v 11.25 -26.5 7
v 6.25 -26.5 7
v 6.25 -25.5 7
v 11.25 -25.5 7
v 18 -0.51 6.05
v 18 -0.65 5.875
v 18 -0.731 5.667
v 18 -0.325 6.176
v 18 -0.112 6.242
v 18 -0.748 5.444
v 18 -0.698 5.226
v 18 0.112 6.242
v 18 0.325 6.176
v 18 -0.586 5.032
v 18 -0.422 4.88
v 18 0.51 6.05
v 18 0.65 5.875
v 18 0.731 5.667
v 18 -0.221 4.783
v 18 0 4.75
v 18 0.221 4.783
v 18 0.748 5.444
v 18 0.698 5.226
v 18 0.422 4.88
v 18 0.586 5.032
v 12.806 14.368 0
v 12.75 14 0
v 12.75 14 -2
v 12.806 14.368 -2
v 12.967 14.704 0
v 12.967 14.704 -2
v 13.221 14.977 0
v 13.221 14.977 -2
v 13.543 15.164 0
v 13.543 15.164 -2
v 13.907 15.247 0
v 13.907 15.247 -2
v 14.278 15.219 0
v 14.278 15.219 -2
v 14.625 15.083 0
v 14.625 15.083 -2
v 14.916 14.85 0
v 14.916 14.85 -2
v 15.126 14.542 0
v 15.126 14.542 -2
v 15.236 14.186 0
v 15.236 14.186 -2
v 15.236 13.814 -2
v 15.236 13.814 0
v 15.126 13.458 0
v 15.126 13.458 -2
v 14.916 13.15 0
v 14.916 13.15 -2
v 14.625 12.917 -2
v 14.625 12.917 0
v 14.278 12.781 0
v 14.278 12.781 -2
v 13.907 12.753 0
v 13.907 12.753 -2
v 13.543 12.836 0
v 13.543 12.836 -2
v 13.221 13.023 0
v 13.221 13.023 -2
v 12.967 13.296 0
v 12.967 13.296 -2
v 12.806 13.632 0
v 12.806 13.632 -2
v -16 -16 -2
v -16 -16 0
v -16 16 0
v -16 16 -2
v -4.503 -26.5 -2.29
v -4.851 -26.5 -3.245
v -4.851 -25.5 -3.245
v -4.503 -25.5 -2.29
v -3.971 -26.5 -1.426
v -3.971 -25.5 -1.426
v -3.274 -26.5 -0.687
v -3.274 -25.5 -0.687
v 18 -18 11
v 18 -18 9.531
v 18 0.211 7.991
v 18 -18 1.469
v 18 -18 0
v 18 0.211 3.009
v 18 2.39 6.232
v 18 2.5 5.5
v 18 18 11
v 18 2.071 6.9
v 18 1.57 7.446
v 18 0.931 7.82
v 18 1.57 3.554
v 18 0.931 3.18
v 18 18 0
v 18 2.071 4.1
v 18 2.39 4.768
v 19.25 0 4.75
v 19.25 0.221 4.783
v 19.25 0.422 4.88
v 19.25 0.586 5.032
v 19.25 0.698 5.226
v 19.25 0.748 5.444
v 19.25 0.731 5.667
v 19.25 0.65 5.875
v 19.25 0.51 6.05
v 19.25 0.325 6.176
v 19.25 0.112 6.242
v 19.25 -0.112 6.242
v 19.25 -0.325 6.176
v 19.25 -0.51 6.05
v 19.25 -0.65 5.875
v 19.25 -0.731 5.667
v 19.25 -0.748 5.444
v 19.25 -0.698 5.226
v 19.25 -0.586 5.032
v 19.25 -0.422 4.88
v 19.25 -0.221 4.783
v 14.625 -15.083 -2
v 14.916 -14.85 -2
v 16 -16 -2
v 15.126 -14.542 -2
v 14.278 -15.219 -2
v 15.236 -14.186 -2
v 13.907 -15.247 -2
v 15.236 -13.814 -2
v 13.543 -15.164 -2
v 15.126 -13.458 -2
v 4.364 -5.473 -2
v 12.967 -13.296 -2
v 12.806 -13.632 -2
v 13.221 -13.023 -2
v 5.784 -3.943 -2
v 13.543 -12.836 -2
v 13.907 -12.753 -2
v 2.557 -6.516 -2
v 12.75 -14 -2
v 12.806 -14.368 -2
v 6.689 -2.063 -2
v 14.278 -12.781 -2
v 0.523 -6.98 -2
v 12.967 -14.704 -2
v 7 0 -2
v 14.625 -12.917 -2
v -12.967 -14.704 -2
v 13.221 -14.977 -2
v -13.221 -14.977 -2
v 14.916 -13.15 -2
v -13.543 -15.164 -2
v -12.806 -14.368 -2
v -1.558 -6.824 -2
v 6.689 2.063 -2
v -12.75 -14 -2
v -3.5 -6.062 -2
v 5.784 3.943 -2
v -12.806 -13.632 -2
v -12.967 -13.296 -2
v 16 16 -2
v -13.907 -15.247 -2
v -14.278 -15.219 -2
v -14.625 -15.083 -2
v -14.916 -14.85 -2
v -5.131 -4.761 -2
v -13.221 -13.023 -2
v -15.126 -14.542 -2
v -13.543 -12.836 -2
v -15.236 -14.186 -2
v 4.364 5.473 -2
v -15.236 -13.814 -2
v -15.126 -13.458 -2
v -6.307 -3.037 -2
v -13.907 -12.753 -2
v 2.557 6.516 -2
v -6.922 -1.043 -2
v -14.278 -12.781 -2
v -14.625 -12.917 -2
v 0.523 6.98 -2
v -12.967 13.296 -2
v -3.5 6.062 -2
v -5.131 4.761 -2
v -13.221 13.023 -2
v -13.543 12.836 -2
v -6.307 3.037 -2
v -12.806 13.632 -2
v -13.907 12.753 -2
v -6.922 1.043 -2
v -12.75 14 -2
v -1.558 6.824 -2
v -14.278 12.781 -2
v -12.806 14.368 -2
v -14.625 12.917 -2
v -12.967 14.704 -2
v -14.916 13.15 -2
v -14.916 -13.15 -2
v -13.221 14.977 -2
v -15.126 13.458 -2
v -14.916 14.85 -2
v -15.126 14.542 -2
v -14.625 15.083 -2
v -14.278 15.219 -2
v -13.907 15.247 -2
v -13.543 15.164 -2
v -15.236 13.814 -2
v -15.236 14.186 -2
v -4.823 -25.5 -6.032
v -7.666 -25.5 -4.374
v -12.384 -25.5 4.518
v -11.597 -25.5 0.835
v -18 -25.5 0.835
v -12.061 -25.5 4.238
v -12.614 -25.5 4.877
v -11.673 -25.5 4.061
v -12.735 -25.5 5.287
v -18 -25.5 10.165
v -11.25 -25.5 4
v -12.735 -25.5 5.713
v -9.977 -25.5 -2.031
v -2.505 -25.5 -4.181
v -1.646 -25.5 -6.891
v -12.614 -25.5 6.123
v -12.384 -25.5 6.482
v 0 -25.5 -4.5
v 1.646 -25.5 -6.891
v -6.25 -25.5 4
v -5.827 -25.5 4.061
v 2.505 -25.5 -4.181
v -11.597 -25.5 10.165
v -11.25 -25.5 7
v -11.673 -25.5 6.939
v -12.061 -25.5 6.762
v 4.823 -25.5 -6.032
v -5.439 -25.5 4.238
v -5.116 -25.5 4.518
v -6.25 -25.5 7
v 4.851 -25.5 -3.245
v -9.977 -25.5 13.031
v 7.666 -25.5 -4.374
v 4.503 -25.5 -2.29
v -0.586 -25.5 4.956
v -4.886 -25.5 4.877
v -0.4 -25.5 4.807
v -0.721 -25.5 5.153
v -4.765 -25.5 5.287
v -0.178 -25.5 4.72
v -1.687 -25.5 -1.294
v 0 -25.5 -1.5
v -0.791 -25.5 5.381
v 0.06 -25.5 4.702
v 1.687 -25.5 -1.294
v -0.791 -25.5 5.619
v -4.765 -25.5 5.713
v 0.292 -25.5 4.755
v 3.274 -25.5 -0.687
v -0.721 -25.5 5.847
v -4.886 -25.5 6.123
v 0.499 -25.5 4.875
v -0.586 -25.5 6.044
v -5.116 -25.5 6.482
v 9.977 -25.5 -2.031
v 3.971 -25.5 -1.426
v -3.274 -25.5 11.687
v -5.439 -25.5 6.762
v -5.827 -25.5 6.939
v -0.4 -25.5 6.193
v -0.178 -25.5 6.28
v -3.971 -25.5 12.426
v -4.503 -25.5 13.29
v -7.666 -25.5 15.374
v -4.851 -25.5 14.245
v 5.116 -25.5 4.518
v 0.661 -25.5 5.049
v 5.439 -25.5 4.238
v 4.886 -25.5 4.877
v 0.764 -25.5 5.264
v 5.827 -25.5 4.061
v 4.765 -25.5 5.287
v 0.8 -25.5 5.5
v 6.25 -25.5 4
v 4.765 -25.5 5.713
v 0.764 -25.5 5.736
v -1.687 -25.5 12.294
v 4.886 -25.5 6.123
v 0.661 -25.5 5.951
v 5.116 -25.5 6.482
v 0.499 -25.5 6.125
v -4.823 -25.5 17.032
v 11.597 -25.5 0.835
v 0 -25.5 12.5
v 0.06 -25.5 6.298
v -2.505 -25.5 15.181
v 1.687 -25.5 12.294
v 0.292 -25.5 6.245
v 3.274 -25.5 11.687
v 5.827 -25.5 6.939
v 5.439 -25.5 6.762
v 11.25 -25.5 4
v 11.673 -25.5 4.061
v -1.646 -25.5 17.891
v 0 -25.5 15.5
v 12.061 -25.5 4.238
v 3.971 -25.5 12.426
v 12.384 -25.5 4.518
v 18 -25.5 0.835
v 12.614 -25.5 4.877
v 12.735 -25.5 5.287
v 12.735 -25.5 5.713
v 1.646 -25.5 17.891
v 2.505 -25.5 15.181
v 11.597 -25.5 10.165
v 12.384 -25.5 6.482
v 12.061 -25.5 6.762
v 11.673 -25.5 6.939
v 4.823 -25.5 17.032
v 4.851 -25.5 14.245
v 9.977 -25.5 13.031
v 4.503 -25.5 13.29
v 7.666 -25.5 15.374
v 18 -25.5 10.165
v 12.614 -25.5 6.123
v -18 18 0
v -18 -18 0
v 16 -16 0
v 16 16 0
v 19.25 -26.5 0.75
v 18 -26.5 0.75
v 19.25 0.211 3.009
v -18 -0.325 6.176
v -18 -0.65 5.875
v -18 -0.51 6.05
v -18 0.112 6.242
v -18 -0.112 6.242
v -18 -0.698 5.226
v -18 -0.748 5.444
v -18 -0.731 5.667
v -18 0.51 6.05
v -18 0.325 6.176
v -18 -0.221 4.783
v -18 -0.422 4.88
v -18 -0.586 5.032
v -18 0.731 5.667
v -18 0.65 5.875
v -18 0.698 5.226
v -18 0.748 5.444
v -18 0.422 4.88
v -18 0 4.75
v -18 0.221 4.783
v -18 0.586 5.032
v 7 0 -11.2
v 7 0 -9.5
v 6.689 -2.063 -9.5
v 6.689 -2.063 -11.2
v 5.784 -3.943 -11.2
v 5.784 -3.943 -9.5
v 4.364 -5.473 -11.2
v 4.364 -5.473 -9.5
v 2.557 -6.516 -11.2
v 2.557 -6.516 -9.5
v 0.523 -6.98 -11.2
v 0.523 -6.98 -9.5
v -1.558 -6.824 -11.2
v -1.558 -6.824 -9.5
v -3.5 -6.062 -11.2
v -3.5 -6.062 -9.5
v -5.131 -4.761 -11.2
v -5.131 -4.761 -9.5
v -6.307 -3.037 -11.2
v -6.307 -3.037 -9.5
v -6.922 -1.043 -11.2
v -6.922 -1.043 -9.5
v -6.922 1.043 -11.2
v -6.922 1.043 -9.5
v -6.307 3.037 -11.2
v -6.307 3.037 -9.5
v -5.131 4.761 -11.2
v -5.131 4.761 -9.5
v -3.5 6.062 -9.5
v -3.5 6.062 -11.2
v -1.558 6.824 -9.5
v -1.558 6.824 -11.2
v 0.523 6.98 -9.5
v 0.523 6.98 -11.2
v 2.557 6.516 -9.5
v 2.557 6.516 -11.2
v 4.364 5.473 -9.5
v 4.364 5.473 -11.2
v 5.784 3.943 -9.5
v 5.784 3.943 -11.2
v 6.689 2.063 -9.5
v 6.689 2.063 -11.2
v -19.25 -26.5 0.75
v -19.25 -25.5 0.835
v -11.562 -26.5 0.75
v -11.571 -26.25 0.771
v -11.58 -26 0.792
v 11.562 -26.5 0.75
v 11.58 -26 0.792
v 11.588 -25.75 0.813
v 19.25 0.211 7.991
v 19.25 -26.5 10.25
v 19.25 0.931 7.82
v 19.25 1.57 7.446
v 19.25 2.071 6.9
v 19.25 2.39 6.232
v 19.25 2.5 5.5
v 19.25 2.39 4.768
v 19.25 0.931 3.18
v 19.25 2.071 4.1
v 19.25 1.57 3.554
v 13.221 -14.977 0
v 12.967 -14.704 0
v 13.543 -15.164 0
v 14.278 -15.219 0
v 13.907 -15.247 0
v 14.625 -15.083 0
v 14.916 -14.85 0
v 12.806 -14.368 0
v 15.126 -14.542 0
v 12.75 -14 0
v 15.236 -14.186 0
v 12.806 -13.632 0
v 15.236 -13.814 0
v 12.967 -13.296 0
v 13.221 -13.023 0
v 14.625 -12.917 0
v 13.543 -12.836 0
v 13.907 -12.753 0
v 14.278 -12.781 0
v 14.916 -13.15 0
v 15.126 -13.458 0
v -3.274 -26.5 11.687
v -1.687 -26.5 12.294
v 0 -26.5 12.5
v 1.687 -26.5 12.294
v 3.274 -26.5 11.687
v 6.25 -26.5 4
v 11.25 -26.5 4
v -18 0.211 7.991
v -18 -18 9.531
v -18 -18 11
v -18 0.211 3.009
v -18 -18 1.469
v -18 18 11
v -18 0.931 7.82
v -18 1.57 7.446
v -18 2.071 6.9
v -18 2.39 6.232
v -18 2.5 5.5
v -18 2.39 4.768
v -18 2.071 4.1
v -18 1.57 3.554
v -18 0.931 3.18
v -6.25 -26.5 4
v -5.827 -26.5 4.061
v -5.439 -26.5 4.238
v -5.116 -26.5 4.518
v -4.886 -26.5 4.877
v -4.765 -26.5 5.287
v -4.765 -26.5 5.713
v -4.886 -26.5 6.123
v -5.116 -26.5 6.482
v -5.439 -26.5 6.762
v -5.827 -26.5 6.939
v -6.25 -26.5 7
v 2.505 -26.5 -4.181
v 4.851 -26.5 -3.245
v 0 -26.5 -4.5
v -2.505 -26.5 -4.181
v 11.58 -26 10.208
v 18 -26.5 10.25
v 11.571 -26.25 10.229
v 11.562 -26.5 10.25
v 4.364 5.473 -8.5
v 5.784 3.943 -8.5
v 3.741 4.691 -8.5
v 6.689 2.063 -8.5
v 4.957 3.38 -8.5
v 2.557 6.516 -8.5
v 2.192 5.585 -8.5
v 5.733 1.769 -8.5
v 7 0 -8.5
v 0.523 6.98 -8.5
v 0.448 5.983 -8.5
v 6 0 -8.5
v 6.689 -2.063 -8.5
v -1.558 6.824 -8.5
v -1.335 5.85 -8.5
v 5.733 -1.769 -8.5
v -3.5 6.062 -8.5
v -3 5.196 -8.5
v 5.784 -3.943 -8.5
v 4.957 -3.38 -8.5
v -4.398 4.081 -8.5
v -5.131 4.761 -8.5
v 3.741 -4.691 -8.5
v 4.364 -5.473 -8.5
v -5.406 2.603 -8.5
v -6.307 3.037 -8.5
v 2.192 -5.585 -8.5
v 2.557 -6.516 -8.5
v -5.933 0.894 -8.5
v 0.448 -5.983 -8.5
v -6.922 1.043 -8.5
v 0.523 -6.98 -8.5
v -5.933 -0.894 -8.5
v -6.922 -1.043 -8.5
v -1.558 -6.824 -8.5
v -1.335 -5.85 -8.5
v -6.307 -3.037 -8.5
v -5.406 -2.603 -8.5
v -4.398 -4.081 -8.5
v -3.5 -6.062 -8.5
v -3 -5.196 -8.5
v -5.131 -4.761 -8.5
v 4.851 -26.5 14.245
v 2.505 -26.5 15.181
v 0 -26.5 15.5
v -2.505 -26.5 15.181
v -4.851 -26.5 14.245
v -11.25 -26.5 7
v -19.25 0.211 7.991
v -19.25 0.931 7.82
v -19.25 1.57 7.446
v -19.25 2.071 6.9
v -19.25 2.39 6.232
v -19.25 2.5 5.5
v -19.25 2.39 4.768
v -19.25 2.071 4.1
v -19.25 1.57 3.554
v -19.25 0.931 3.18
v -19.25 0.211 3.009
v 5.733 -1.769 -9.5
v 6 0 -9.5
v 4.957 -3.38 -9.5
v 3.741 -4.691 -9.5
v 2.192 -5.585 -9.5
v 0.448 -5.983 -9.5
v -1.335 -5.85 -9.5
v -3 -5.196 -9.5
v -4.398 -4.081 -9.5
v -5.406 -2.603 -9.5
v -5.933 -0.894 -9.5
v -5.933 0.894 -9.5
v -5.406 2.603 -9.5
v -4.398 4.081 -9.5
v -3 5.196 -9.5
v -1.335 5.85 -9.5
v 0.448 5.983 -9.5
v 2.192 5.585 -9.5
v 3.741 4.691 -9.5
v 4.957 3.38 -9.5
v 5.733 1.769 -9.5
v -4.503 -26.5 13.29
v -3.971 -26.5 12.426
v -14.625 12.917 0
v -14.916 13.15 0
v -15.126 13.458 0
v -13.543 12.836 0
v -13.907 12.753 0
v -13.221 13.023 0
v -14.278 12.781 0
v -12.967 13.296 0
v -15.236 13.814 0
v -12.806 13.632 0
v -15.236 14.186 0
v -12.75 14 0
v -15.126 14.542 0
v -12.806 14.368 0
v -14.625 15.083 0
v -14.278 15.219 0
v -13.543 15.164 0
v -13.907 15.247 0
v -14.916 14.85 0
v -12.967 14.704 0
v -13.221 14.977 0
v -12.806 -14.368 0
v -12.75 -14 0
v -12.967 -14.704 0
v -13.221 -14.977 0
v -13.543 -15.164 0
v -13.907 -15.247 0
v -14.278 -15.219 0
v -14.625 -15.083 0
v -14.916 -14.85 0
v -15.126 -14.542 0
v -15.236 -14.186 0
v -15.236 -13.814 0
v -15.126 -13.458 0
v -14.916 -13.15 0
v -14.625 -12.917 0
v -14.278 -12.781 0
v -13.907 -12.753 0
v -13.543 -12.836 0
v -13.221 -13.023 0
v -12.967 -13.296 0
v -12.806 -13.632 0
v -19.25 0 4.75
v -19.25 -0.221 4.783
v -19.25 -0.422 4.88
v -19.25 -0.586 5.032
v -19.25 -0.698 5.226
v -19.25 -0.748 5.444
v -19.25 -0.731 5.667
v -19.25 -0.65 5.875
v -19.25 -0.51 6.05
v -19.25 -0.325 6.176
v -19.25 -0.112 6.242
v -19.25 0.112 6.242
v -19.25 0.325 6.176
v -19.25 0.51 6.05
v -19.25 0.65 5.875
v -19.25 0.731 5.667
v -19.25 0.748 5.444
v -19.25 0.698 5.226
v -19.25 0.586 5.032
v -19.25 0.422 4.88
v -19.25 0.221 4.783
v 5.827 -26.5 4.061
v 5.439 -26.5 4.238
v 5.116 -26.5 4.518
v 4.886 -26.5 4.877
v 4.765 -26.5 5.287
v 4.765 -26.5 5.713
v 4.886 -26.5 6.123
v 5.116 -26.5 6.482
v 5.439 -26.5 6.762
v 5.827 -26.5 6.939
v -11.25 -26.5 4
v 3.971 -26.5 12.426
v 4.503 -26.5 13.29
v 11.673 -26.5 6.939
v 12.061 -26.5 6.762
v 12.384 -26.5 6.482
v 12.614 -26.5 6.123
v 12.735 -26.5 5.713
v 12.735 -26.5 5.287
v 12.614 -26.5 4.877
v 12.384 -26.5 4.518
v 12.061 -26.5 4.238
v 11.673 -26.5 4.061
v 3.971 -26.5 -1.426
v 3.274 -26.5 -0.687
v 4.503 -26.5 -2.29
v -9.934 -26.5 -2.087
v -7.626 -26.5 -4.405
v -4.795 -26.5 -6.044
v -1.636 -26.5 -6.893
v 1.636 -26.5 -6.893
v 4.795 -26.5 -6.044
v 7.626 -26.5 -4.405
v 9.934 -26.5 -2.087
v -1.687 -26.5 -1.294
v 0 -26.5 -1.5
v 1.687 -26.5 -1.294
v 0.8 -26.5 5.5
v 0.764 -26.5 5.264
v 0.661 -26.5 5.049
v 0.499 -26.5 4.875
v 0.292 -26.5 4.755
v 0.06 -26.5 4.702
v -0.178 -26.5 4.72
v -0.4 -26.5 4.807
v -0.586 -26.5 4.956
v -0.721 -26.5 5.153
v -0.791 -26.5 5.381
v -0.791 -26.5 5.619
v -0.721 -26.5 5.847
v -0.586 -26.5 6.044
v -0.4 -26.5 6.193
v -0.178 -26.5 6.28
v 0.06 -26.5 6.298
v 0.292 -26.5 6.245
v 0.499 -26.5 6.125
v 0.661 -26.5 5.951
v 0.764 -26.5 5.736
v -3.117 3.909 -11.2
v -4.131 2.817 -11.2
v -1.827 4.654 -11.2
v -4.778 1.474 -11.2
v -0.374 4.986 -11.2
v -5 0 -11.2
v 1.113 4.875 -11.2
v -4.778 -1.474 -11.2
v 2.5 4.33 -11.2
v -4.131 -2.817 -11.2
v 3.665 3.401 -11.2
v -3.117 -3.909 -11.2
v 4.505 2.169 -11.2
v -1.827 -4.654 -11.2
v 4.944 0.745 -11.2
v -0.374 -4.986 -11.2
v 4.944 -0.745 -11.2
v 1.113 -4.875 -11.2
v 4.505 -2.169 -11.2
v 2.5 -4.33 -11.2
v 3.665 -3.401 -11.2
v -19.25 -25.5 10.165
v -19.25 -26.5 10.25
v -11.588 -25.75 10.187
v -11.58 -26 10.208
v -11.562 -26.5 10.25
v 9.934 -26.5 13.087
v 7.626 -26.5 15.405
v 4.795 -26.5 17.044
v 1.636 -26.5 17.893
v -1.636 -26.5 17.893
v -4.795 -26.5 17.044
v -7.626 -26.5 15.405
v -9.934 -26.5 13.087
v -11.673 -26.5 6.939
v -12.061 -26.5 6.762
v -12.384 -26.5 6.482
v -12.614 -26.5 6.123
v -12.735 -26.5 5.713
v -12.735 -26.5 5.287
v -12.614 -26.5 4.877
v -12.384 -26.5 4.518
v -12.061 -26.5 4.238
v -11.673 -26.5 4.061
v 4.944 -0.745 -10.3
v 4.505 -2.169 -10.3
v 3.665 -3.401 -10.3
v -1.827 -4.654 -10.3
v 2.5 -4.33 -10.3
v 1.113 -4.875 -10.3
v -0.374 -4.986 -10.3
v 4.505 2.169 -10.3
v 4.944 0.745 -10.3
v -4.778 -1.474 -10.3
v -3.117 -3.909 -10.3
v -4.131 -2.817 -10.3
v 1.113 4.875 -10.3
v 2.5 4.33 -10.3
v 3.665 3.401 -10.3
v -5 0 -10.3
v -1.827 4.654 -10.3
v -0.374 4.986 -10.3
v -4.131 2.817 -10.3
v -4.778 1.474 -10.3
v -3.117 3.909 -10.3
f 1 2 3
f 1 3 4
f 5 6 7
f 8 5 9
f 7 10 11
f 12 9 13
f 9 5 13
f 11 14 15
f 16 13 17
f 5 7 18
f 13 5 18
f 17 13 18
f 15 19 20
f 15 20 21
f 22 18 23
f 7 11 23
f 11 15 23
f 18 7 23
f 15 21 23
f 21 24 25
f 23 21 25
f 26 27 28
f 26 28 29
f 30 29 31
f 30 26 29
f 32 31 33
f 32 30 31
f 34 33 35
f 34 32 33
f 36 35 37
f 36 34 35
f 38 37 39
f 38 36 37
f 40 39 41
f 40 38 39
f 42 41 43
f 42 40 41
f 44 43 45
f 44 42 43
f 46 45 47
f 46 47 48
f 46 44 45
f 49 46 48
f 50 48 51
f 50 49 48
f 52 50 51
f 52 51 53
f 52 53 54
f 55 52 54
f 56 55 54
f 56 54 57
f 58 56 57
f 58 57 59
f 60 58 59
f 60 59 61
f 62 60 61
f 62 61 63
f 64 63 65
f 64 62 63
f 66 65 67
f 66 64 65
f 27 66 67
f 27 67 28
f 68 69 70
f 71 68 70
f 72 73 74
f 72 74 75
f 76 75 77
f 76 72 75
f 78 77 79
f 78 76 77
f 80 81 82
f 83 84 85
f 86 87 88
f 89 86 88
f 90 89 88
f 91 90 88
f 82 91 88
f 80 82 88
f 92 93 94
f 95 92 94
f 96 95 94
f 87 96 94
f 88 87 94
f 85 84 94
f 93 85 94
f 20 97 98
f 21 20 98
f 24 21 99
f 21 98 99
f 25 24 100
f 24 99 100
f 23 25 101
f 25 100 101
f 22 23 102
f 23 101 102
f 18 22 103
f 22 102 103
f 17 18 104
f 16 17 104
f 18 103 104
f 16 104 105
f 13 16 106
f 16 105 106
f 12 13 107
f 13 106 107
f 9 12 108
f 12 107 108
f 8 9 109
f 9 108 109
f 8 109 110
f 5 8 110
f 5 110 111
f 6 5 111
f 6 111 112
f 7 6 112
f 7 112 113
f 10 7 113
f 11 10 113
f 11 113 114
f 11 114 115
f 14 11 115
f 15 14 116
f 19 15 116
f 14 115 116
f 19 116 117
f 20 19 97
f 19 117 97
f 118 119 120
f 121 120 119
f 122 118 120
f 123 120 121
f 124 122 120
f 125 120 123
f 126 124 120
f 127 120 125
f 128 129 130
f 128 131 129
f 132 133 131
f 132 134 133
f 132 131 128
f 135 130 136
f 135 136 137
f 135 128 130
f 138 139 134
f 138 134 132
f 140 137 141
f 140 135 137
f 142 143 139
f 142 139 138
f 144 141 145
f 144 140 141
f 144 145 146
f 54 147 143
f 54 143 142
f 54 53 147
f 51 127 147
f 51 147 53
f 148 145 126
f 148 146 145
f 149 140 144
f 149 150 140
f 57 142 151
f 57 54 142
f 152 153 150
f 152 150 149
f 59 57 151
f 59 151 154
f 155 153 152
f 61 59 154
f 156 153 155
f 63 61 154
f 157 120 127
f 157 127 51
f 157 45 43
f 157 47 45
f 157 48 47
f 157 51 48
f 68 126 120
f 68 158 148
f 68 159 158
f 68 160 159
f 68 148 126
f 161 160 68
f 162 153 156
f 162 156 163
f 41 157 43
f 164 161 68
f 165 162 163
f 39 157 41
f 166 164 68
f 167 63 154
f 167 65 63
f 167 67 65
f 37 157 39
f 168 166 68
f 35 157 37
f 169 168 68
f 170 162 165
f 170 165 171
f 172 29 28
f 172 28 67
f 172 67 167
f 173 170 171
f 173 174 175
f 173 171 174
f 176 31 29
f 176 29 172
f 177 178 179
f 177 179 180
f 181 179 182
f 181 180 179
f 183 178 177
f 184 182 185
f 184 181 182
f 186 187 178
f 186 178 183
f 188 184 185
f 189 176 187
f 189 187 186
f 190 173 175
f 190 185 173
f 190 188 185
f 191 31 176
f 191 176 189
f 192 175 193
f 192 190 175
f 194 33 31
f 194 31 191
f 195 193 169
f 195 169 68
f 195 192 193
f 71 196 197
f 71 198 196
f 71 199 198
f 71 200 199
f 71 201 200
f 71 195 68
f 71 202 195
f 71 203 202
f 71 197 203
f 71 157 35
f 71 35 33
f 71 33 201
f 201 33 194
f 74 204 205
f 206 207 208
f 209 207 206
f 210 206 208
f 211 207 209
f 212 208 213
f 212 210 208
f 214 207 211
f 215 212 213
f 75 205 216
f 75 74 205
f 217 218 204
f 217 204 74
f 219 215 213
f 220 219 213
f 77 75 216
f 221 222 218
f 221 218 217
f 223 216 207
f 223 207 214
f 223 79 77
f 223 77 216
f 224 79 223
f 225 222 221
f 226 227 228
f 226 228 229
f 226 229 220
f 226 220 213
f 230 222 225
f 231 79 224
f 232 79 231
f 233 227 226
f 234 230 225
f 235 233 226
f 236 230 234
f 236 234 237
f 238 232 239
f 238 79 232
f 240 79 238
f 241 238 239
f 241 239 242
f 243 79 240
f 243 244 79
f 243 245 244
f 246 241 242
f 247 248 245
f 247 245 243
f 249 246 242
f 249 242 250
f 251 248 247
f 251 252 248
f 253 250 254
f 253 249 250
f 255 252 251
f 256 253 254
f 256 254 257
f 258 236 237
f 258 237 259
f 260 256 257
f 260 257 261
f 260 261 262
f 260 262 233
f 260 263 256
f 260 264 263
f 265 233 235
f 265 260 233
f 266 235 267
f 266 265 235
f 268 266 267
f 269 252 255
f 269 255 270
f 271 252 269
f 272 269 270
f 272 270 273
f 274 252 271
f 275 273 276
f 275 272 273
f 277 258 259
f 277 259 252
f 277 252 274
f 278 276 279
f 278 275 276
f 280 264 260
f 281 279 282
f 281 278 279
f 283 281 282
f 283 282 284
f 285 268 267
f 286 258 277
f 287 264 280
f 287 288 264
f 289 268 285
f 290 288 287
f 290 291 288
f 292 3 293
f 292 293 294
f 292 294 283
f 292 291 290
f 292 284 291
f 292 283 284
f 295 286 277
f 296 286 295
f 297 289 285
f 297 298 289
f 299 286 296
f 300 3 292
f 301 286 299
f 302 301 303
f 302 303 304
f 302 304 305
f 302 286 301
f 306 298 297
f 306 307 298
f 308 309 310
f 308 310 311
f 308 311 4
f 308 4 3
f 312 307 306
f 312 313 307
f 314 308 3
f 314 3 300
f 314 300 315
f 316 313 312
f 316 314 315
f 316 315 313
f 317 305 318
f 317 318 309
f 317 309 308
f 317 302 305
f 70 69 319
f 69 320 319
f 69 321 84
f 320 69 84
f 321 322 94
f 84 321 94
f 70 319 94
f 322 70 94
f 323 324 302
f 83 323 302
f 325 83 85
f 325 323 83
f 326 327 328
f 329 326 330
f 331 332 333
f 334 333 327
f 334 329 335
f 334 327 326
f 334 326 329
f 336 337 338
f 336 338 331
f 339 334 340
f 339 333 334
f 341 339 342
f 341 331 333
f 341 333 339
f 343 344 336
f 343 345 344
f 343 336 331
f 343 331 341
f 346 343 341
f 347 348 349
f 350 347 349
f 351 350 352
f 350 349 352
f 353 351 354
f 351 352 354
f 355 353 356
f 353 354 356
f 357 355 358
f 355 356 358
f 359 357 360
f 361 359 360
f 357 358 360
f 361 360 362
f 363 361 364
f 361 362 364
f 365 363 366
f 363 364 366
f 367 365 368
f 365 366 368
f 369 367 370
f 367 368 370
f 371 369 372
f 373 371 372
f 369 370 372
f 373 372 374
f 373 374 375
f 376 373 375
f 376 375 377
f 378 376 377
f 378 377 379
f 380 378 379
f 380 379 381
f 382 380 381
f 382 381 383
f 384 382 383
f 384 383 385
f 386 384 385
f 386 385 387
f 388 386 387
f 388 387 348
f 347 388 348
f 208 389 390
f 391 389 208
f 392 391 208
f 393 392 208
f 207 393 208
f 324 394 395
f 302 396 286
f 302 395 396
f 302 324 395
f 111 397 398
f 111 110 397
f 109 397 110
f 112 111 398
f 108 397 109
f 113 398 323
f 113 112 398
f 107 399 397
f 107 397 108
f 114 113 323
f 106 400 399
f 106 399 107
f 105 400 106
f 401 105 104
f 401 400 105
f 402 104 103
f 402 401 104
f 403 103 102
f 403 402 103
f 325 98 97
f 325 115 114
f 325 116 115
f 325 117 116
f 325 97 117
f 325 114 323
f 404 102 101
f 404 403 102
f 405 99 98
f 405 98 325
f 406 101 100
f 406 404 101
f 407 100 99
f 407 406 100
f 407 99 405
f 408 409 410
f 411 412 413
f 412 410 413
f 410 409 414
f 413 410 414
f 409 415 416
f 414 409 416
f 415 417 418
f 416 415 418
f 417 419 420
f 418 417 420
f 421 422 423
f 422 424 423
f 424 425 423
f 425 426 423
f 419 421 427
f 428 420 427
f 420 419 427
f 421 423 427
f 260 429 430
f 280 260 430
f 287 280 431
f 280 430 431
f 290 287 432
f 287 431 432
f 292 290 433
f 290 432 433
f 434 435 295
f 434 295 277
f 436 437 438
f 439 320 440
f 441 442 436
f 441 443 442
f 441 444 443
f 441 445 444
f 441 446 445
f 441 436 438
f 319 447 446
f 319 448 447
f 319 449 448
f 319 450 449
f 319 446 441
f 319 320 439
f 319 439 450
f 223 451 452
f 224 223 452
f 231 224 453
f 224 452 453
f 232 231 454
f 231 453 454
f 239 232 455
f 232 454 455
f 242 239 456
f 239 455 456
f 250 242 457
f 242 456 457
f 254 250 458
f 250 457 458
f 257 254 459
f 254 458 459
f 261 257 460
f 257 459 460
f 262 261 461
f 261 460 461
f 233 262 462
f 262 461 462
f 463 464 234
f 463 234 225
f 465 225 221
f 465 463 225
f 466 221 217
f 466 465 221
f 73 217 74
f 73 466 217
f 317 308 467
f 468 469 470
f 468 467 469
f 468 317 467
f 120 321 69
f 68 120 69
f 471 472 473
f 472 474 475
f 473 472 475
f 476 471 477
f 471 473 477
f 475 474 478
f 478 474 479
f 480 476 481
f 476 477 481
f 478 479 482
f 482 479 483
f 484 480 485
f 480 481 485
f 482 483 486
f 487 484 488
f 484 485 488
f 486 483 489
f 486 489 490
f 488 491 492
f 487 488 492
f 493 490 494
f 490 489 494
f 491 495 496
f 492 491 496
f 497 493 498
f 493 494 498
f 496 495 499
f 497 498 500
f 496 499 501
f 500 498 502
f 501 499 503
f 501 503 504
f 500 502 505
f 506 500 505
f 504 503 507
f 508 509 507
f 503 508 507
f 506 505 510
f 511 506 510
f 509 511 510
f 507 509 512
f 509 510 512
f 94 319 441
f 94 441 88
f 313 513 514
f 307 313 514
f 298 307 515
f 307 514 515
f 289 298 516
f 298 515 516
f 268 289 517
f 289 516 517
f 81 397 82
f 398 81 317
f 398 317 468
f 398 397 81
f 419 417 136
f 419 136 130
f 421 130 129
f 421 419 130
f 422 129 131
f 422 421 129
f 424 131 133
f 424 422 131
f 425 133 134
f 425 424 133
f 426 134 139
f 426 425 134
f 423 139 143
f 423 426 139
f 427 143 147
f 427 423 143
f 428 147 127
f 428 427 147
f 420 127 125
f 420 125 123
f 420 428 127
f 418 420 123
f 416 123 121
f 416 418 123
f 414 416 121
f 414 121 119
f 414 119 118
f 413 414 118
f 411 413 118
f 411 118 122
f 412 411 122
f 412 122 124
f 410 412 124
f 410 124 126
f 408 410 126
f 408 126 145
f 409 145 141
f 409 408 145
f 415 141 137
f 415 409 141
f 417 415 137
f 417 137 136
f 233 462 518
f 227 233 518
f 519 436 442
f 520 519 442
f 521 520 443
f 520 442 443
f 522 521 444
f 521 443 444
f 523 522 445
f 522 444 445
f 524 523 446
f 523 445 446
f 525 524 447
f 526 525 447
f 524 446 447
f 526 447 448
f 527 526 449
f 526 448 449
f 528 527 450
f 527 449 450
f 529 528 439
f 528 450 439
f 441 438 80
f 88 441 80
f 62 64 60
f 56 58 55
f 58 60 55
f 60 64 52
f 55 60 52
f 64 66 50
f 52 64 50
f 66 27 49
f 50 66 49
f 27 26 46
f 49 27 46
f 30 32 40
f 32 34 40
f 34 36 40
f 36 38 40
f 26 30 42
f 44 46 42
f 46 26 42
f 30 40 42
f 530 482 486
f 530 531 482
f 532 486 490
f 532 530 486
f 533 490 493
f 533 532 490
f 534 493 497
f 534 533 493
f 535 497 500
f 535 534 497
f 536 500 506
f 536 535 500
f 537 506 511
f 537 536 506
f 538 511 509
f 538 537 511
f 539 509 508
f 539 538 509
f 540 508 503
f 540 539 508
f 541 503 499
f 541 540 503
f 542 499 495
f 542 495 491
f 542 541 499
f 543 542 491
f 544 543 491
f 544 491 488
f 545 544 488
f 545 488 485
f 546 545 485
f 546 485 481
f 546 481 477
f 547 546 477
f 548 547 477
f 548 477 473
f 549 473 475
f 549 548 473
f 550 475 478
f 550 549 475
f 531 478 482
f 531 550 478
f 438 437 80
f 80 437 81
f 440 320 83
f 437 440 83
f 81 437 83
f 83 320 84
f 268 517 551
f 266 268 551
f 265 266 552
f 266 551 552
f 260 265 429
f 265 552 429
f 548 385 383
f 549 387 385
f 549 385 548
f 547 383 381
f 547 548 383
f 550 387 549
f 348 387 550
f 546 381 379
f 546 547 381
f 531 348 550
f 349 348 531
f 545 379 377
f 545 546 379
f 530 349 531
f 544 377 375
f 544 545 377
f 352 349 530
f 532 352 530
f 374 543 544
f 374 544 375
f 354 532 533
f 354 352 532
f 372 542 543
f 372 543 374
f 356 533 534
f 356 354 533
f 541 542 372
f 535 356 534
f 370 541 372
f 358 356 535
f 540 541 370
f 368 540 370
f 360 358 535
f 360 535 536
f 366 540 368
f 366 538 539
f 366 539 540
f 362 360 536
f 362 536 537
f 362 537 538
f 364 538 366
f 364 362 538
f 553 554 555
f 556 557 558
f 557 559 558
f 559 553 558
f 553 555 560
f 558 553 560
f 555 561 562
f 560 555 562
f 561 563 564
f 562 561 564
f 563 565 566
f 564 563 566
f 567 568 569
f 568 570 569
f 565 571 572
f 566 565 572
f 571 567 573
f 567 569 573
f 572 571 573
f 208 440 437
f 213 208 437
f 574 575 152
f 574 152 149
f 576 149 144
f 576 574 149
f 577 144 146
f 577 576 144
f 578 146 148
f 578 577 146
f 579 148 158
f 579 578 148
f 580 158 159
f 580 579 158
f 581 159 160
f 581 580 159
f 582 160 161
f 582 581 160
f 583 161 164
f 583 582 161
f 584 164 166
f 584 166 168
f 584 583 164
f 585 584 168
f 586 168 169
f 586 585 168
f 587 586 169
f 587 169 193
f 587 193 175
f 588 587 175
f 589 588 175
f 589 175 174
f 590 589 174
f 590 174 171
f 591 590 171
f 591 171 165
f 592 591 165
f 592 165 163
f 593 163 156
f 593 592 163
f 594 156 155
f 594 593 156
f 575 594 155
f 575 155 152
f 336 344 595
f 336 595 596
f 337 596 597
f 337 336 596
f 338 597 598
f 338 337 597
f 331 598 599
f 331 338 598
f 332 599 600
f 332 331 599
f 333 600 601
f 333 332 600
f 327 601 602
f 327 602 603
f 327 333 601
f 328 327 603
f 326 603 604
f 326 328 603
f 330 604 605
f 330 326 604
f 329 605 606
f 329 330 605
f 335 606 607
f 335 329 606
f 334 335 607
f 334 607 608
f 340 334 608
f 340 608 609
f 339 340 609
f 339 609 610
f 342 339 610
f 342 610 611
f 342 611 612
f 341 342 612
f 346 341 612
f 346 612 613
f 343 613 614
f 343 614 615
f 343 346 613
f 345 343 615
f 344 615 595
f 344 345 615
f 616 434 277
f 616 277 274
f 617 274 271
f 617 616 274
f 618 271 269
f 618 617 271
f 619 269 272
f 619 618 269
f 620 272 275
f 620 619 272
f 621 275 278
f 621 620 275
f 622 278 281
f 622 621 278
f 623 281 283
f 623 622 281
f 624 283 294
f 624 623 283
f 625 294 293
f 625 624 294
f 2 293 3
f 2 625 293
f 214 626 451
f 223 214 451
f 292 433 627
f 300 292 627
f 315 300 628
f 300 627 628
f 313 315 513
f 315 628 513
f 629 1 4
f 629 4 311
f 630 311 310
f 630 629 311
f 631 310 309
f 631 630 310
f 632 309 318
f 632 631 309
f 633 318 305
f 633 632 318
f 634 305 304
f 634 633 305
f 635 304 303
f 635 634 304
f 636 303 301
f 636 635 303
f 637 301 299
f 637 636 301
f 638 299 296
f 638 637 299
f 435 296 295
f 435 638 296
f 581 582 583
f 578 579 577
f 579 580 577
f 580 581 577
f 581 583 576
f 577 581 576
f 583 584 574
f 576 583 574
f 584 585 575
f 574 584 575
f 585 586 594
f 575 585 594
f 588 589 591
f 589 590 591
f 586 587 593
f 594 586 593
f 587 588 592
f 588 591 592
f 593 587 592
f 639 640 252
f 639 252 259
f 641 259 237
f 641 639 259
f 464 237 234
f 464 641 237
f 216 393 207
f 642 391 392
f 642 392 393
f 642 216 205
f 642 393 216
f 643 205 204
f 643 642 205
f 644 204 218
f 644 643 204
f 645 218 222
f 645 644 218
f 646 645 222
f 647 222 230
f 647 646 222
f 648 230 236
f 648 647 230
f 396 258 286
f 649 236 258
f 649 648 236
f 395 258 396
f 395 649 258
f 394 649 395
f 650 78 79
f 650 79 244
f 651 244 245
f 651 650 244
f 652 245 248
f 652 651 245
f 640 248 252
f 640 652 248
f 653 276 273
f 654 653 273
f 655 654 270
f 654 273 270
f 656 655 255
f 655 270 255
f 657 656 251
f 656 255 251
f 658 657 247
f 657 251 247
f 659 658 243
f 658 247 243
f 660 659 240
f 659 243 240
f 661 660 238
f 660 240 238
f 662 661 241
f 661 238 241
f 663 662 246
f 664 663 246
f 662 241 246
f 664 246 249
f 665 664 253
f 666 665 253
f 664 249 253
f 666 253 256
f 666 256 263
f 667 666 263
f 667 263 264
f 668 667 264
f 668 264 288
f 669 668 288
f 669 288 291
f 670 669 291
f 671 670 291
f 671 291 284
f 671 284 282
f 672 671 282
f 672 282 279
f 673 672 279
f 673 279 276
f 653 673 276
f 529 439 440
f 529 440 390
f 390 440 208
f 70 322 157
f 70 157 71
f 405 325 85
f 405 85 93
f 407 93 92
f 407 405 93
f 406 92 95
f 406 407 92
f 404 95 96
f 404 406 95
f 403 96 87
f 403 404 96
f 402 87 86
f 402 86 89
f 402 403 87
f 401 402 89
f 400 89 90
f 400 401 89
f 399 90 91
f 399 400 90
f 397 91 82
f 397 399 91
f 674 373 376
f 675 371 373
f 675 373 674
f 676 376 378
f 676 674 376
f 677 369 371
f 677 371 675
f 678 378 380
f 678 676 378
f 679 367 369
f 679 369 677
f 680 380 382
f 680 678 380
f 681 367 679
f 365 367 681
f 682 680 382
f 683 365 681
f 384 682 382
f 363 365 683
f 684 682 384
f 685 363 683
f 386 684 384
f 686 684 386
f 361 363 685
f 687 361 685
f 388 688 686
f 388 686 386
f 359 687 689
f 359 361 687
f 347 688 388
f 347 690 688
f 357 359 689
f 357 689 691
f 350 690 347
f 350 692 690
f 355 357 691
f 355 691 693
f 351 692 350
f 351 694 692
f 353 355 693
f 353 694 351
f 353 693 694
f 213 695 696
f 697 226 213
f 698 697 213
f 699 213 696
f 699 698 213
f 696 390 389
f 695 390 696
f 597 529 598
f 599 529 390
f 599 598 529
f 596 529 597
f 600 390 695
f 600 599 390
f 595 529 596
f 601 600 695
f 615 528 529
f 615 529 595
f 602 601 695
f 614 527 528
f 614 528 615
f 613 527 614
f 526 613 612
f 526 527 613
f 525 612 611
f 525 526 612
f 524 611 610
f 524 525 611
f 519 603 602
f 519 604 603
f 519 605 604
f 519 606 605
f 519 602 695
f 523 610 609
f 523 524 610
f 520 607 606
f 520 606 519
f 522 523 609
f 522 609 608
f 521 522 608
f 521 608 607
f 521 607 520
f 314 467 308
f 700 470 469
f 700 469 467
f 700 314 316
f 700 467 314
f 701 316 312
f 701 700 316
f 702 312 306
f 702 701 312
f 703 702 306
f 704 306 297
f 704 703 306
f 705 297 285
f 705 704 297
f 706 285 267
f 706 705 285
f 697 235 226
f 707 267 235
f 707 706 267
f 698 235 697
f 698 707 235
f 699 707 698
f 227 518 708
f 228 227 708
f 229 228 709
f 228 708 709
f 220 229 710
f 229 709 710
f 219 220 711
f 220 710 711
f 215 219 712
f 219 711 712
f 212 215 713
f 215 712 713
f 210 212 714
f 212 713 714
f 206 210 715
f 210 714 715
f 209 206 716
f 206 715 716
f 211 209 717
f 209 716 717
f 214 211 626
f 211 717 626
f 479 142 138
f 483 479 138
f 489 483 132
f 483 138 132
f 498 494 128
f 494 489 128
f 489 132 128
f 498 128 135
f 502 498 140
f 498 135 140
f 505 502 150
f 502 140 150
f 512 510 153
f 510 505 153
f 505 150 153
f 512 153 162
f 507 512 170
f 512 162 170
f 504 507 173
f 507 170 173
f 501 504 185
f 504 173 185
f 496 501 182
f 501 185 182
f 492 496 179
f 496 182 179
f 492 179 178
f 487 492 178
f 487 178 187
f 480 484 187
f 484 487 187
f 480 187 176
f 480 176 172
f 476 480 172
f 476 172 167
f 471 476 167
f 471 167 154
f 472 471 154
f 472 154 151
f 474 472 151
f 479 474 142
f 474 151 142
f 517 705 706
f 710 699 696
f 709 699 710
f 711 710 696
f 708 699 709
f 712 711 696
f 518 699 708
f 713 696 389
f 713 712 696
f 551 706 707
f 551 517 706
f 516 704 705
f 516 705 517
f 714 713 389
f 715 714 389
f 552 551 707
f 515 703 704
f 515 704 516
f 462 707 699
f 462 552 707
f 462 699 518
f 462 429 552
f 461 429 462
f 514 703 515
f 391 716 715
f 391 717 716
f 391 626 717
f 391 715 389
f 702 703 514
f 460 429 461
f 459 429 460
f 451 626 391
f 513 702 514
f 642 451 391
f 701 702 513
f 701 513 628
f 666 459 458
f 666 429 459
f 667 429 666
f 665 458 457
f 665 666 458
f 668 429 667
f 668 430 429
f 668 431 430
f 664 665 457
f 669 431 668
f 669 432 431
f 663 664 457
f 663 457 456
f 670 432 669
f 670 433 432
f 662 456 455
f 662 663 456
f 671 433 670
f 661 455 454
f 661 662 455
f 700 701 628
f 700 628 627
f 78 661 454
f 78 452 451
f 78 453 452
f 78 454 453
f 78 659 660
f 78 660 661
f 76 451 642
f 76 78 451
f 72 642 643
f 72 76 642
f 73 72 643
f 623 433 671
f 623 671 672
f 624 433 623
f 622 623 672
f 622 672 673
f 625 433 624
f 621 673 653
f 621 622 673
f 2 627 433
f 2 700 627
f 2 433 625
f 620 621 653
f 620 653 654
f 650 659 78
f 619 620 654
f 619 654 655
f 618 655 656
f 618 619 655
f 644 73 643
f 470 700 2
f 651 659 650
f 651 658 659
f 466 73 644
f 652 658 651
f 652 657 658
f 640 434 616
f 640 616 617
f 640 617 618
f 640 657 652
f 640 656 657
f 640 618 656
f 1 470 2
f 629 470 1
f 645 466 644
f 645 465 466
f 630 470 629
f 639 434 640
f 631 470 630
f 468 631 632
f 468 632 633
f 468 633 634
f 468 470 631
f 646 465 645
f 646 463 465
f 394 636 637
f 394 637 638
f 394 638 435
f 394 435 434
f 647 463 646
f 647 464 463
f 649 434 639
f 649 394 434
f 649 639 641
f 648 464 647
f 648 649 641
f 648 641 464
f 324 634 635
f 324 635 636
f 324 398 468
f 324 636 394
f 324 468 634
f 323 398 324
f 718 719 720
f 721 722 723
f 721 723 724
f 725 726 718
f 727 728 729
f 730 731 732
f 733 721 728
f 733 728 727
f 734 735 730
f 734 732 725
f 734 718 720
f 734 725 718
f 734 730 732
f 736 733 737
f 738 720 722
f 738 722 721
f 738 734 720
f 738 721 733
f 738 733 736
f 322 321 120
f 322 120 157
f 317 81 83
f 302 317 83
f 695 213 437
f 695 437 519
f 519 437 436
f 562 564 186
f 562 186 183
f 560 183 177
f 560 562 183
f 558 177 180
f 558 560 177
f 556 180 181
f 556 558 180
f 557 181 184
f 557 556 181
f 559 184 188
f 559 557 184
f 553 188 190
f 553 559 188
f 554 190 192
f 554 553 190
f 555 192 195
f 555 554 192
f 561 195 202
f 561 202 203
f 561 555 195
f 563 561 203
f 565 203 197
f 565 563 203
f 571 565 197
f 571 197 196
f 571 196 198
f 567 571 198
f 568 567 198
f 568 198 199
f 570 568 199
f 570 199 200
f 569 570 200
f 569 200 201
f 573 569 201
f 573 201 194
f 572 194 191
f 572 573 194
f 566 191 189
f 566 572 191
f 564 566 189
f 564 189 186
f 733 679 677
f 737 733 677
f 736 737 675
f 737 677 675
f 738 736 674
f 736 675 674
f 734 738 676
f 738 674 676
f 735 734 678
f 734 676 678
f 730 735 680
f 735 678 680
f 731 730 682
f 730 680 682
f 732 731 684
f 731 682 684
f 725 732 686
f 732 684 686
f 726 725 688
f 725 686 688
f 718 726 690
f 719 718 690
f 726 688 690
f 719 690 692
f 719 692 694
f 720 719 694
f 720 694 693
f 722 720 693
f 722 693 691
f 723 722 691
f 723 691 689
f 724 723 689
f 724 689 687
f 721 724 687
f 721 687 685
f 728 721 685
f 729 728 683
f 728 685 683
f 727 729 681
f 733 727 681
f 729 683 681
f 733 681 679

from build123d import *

# Parameters (mm, degrees)
SKETCH_1_W             = 36
SKETCH_1_H             = 36
EXTRUDE_1_DEPTH        = 11
SKETCH_2_W             = 32
SKETCH_2_H             = 32
SKETCH_2_R             = 1.25
EXTRUDE_2_DEPTH        = 2
EXTRUDE_START          = -11
SKETCH_3_R             = 7
EXTRUDE_3_DEPTH        = 22.2
SKETCH_4_W             = 1
SKETCH_4_H             = 2
SKETCH_5_R             = 5
CUT_EXTRUDE_1_DEPTH    = 0.9
EXTRUDE_START_2        = 19.25
SKETCH_6_R             = 0.75
EXTRUDE_4_DEPTH        = 1.25
EXTRUDE_5_DEPTH        = 37.25
SKETCH_9_R             = 12.5
SKETCH_9_R_2           = 1
EXTRUDE_6_DEPTH        = 1
CUT_EXTRUDE_2_DEPTH    = 2
SKETCH_10_R            = 0.75
EXTRUDE_7_DEPTH        = 1.25
HOLE_WIZARD_M2_1_D     = 1.6
HOLE_WIZARD_M2_1_DEPTH = 2
HOLE_WIZARD_M2_1_TIP   = 0.480688495


with BuildPart() as part:
    # 草图1 → 凸台-拉伸1 (new body)
    with BuildSketch(Plane.XY):
        Rectangle(SKETCH_1_W, SKETCH_1_H)
    extrude(amount=EXTRUDE_1_DEPTH)

    # 草图2 → 凸台-拉伸2 (add)
    with BuildSketch(Plane(origin=(0, 0, 0), x_dir=(-1, 0, 0), z_dir=(0, 0, -1))):
        Rectangle(SKETCH_2_W, SKETCH_2_H)
        with Locations((-14, 14)):
            Circle(SKETCH_2_R, mode=Mode.SUBTRACT)
        with Locations(Location((14, -14, 0), (0, 0, 180))):
            Circle(SKETCH_2_R, mode=Mode.SUBTRACT)
        with Locations(Location((14, 14, 0), (0, 0, 180))):
            Circle(SKETCH_2_R, mode=Mode.SUBTRACT)
        with Locations((-14, -14)):
            Circle(SKETCH_2_R, mode=Mode.SUBTRACT)
    extrude(amount=EXTRUDE_2_DEPTH)

    # 草图3 → 凸台-拉伸3 (add)
    with BuildSketch(Plane(origin=(0, 0, 0), x_dir=(-1, 0, 0), z_dir=(0, 0, -1)).offset(EXTRUDE_START)):
        with Locations(Location((0, 0, 0), (0, 0, 180))):
            Circle(SKETCH_3_R)
    extrude(amount=EXTRUDE_3_DEPTH)

    # 草图4 → 切除-旋转1 (revolve, cut)
    with BuildSketch(Plane(origin=(0, 0, 0), x_dir=(0, 0, -1), z_dir=(1, 0, 0)), mode=Mode.PRIVATE) as cut_revolve_1_sk:
        with Locations((9, 7)):
            Rectangle(SKETCH_4_W, SKETCH_4_H)
    revolve(cut_revolve_1_sk.sketch.rotate(Axis((0, 0, 0), (0, 0, -1)), 90), axis=Axis((0, 0, 0), (0, 0, -1)), mode=Mode.SUBTRACT)

    # 草图5 → 切除-拉伸1 (cut)
    with BuildSketch(Plane(origin=(0, 0, -11.2), x_dir=(-1, 0, 0), z_dir=(0, 0, -1))):
        Circle(SKETCH_5_R)
    extrude(amount=-CUT_EXTRUDE_1_DEPTH, mode=Mode.SUBTRACT)

    # 草图6 → 凸台-拉伸4 (add)
    with BuildSketch(Plane(origin=(0, 0, 0), x_dir=(0, 0, -1), z_dir=(1, 0, 0)).offset(EXTRUDE_START_2)):
        with BuildLine():
            Line((-0.75, -26.5), (-3.008892206, 0.210670265))
            ThreePointArc((-3.008892206, 0.210670265), (-5.5, 2.5), (-7.991107794, 0.210670265))
            Line((-7.991107794, 0.210670265), (-10.25, -26.5))
            Line((-10.25, -26.5), (-0.75, -26.5))
        make_face()
        with Locations((-5.5, 0)):
            Circle(SKETCH_6_R, mode=Mode.SUBTRACT)
    extrude(amount=-EXTRUDE_4_DEPTH)

    # 草图7 → 凸台-拉伸5 (add)
    with BuildSketch(Plane.ZY.offset(-18)):
        Polygon((0.834568908, -25.5), (10.165431092, -25.5), (10.25, -26.5), (0.75, -26.5), align=None)
    extrude(amount=EXTRUDE_5_DEPTH)

    # 草图9 → 凸台-拉伸6 (add)
    with BuildSketch(Plane.XZ.offset(26.5)):
        with Locations((0, 5.5)):
            Circle(SKETCH_9_R)
        with Locations((0, 5.5)):
            Circle(SKETCH_9_R_2, mode=Mode.SUBTRACT)
        with BuildLine():
            ThreePointArc((4.850909325, 14.244637141), (0, 15.5), (-4.850909325, 14.244637141))
            ThreePointArc((-4.850909325, 14.244637141), (-4.258969051, 12.844732491), (-3.274022071, 11.687146312))
            ThreePointArc((-3.274022071, 11.687146312), (0, 12.5), (3.274022071, 11.687146312))
            ThreePointArc((3.274022071, 11.687146312), (4.258969051, 12.844732491), (4.850909325, 14.244637141))
        make_face(mode=Mode.SUBTRACT)
        with BuildLine():
            ThreePointArc((-4.850909325, -3.244637141), (-4.258969051, -1.844732491), (-3.274022071, -0.687146312))
            ThreePointArc((-3.274022071, -0.687146312), (0, -1.5), (3.274022071, -0.687146312))
            ThreePointArc((3.274022071, -0.687146312), (4.258969051, -1.844732491), (4.850909325, -3.244637141))
            ThreePointArc((4.850909325, -3.244637141), (0, -4.5), (-4.850909325, -3.244637141))
        make_face(mode=Mode.SUBTRACT)
    extrude(amount=-EXTRUDE_6_DEPTH)

    # 草图8 → 切除-拉伸2 (cut)
    with BuildSketch(Plane.XZ.offset(26.5)):
        with BuildLine():
            Line((6.25, 7), (11.25, 7))
            ThreePointArc((11.25, 7), (12.75, 5.5), (11.25, 4))
            Line((11.25, 4), (6.25, 4))
            ThreePointArc((6.25, 4), (4.75, 5.5), (6.25, 7))
        make_face()
    cut_extrude_2 = extrude(amount=-CUT_EXTRUDE_2_DEPTH, mode=Mode.SUBTRACT)

    # 草图10 → 凸台-拉伸7 (add)
    with BuildSketch(Plane.ZY.offset(18)):
        with BuildLine():
            Line((3.008892206, 0.210670265), (0.75, -26.5))
            Line((0.75, -26.5), (10.25, -26.5))
            Line((10.25, -26.5), (7.991107794, 0.210670265))
            ThreePointArc((7.991107794, 0.210670265), (5.5, 2.5), (3.008892206, 0.210670265))
        make_face()
        with Locations(Location((5.5, 0, 0), (0, 0, 180))):
            Circle(SKETCH_10_R, mode=Mode.SUBTRACT)
    extrude(amount=EXTRUDE_7_DEPTH)

    # 镜向3: 切除-拉伸2 across plane
    add(cut_extrude_2.mirror(Plane(origin=(0, 0, 0), x_dir=(0, 0, 1), z_dir=(1, 0, 0))), mode=Mode.SUBTRACT)

    # M2 螺纹孔的螺纹孔钻头1
    with Locations(Plane(origin=(0, -26.5, 0), x_dir=(-1, 0, 0), z_dir=(0, -1, 0))):
        with Locations((0, -5.5)):
            Hole(HOLE_WIZARD_M2_1_D / 2, depth=HOLE_WIZARD_M2_1_DEPTH)
            with Locations((0, 0, -(HOLE_WIZARD_M2_1_DEPTH + HOLE_WIZARD_M2_1_TIP / 2))):  # 118° drill point
                Cone(0, HOLE_WIZARD_M2_1_D / 2, HOLE_WIZARD_M2_1_TIP, mode=Mode.SUBTRACT)


solid = part.part
